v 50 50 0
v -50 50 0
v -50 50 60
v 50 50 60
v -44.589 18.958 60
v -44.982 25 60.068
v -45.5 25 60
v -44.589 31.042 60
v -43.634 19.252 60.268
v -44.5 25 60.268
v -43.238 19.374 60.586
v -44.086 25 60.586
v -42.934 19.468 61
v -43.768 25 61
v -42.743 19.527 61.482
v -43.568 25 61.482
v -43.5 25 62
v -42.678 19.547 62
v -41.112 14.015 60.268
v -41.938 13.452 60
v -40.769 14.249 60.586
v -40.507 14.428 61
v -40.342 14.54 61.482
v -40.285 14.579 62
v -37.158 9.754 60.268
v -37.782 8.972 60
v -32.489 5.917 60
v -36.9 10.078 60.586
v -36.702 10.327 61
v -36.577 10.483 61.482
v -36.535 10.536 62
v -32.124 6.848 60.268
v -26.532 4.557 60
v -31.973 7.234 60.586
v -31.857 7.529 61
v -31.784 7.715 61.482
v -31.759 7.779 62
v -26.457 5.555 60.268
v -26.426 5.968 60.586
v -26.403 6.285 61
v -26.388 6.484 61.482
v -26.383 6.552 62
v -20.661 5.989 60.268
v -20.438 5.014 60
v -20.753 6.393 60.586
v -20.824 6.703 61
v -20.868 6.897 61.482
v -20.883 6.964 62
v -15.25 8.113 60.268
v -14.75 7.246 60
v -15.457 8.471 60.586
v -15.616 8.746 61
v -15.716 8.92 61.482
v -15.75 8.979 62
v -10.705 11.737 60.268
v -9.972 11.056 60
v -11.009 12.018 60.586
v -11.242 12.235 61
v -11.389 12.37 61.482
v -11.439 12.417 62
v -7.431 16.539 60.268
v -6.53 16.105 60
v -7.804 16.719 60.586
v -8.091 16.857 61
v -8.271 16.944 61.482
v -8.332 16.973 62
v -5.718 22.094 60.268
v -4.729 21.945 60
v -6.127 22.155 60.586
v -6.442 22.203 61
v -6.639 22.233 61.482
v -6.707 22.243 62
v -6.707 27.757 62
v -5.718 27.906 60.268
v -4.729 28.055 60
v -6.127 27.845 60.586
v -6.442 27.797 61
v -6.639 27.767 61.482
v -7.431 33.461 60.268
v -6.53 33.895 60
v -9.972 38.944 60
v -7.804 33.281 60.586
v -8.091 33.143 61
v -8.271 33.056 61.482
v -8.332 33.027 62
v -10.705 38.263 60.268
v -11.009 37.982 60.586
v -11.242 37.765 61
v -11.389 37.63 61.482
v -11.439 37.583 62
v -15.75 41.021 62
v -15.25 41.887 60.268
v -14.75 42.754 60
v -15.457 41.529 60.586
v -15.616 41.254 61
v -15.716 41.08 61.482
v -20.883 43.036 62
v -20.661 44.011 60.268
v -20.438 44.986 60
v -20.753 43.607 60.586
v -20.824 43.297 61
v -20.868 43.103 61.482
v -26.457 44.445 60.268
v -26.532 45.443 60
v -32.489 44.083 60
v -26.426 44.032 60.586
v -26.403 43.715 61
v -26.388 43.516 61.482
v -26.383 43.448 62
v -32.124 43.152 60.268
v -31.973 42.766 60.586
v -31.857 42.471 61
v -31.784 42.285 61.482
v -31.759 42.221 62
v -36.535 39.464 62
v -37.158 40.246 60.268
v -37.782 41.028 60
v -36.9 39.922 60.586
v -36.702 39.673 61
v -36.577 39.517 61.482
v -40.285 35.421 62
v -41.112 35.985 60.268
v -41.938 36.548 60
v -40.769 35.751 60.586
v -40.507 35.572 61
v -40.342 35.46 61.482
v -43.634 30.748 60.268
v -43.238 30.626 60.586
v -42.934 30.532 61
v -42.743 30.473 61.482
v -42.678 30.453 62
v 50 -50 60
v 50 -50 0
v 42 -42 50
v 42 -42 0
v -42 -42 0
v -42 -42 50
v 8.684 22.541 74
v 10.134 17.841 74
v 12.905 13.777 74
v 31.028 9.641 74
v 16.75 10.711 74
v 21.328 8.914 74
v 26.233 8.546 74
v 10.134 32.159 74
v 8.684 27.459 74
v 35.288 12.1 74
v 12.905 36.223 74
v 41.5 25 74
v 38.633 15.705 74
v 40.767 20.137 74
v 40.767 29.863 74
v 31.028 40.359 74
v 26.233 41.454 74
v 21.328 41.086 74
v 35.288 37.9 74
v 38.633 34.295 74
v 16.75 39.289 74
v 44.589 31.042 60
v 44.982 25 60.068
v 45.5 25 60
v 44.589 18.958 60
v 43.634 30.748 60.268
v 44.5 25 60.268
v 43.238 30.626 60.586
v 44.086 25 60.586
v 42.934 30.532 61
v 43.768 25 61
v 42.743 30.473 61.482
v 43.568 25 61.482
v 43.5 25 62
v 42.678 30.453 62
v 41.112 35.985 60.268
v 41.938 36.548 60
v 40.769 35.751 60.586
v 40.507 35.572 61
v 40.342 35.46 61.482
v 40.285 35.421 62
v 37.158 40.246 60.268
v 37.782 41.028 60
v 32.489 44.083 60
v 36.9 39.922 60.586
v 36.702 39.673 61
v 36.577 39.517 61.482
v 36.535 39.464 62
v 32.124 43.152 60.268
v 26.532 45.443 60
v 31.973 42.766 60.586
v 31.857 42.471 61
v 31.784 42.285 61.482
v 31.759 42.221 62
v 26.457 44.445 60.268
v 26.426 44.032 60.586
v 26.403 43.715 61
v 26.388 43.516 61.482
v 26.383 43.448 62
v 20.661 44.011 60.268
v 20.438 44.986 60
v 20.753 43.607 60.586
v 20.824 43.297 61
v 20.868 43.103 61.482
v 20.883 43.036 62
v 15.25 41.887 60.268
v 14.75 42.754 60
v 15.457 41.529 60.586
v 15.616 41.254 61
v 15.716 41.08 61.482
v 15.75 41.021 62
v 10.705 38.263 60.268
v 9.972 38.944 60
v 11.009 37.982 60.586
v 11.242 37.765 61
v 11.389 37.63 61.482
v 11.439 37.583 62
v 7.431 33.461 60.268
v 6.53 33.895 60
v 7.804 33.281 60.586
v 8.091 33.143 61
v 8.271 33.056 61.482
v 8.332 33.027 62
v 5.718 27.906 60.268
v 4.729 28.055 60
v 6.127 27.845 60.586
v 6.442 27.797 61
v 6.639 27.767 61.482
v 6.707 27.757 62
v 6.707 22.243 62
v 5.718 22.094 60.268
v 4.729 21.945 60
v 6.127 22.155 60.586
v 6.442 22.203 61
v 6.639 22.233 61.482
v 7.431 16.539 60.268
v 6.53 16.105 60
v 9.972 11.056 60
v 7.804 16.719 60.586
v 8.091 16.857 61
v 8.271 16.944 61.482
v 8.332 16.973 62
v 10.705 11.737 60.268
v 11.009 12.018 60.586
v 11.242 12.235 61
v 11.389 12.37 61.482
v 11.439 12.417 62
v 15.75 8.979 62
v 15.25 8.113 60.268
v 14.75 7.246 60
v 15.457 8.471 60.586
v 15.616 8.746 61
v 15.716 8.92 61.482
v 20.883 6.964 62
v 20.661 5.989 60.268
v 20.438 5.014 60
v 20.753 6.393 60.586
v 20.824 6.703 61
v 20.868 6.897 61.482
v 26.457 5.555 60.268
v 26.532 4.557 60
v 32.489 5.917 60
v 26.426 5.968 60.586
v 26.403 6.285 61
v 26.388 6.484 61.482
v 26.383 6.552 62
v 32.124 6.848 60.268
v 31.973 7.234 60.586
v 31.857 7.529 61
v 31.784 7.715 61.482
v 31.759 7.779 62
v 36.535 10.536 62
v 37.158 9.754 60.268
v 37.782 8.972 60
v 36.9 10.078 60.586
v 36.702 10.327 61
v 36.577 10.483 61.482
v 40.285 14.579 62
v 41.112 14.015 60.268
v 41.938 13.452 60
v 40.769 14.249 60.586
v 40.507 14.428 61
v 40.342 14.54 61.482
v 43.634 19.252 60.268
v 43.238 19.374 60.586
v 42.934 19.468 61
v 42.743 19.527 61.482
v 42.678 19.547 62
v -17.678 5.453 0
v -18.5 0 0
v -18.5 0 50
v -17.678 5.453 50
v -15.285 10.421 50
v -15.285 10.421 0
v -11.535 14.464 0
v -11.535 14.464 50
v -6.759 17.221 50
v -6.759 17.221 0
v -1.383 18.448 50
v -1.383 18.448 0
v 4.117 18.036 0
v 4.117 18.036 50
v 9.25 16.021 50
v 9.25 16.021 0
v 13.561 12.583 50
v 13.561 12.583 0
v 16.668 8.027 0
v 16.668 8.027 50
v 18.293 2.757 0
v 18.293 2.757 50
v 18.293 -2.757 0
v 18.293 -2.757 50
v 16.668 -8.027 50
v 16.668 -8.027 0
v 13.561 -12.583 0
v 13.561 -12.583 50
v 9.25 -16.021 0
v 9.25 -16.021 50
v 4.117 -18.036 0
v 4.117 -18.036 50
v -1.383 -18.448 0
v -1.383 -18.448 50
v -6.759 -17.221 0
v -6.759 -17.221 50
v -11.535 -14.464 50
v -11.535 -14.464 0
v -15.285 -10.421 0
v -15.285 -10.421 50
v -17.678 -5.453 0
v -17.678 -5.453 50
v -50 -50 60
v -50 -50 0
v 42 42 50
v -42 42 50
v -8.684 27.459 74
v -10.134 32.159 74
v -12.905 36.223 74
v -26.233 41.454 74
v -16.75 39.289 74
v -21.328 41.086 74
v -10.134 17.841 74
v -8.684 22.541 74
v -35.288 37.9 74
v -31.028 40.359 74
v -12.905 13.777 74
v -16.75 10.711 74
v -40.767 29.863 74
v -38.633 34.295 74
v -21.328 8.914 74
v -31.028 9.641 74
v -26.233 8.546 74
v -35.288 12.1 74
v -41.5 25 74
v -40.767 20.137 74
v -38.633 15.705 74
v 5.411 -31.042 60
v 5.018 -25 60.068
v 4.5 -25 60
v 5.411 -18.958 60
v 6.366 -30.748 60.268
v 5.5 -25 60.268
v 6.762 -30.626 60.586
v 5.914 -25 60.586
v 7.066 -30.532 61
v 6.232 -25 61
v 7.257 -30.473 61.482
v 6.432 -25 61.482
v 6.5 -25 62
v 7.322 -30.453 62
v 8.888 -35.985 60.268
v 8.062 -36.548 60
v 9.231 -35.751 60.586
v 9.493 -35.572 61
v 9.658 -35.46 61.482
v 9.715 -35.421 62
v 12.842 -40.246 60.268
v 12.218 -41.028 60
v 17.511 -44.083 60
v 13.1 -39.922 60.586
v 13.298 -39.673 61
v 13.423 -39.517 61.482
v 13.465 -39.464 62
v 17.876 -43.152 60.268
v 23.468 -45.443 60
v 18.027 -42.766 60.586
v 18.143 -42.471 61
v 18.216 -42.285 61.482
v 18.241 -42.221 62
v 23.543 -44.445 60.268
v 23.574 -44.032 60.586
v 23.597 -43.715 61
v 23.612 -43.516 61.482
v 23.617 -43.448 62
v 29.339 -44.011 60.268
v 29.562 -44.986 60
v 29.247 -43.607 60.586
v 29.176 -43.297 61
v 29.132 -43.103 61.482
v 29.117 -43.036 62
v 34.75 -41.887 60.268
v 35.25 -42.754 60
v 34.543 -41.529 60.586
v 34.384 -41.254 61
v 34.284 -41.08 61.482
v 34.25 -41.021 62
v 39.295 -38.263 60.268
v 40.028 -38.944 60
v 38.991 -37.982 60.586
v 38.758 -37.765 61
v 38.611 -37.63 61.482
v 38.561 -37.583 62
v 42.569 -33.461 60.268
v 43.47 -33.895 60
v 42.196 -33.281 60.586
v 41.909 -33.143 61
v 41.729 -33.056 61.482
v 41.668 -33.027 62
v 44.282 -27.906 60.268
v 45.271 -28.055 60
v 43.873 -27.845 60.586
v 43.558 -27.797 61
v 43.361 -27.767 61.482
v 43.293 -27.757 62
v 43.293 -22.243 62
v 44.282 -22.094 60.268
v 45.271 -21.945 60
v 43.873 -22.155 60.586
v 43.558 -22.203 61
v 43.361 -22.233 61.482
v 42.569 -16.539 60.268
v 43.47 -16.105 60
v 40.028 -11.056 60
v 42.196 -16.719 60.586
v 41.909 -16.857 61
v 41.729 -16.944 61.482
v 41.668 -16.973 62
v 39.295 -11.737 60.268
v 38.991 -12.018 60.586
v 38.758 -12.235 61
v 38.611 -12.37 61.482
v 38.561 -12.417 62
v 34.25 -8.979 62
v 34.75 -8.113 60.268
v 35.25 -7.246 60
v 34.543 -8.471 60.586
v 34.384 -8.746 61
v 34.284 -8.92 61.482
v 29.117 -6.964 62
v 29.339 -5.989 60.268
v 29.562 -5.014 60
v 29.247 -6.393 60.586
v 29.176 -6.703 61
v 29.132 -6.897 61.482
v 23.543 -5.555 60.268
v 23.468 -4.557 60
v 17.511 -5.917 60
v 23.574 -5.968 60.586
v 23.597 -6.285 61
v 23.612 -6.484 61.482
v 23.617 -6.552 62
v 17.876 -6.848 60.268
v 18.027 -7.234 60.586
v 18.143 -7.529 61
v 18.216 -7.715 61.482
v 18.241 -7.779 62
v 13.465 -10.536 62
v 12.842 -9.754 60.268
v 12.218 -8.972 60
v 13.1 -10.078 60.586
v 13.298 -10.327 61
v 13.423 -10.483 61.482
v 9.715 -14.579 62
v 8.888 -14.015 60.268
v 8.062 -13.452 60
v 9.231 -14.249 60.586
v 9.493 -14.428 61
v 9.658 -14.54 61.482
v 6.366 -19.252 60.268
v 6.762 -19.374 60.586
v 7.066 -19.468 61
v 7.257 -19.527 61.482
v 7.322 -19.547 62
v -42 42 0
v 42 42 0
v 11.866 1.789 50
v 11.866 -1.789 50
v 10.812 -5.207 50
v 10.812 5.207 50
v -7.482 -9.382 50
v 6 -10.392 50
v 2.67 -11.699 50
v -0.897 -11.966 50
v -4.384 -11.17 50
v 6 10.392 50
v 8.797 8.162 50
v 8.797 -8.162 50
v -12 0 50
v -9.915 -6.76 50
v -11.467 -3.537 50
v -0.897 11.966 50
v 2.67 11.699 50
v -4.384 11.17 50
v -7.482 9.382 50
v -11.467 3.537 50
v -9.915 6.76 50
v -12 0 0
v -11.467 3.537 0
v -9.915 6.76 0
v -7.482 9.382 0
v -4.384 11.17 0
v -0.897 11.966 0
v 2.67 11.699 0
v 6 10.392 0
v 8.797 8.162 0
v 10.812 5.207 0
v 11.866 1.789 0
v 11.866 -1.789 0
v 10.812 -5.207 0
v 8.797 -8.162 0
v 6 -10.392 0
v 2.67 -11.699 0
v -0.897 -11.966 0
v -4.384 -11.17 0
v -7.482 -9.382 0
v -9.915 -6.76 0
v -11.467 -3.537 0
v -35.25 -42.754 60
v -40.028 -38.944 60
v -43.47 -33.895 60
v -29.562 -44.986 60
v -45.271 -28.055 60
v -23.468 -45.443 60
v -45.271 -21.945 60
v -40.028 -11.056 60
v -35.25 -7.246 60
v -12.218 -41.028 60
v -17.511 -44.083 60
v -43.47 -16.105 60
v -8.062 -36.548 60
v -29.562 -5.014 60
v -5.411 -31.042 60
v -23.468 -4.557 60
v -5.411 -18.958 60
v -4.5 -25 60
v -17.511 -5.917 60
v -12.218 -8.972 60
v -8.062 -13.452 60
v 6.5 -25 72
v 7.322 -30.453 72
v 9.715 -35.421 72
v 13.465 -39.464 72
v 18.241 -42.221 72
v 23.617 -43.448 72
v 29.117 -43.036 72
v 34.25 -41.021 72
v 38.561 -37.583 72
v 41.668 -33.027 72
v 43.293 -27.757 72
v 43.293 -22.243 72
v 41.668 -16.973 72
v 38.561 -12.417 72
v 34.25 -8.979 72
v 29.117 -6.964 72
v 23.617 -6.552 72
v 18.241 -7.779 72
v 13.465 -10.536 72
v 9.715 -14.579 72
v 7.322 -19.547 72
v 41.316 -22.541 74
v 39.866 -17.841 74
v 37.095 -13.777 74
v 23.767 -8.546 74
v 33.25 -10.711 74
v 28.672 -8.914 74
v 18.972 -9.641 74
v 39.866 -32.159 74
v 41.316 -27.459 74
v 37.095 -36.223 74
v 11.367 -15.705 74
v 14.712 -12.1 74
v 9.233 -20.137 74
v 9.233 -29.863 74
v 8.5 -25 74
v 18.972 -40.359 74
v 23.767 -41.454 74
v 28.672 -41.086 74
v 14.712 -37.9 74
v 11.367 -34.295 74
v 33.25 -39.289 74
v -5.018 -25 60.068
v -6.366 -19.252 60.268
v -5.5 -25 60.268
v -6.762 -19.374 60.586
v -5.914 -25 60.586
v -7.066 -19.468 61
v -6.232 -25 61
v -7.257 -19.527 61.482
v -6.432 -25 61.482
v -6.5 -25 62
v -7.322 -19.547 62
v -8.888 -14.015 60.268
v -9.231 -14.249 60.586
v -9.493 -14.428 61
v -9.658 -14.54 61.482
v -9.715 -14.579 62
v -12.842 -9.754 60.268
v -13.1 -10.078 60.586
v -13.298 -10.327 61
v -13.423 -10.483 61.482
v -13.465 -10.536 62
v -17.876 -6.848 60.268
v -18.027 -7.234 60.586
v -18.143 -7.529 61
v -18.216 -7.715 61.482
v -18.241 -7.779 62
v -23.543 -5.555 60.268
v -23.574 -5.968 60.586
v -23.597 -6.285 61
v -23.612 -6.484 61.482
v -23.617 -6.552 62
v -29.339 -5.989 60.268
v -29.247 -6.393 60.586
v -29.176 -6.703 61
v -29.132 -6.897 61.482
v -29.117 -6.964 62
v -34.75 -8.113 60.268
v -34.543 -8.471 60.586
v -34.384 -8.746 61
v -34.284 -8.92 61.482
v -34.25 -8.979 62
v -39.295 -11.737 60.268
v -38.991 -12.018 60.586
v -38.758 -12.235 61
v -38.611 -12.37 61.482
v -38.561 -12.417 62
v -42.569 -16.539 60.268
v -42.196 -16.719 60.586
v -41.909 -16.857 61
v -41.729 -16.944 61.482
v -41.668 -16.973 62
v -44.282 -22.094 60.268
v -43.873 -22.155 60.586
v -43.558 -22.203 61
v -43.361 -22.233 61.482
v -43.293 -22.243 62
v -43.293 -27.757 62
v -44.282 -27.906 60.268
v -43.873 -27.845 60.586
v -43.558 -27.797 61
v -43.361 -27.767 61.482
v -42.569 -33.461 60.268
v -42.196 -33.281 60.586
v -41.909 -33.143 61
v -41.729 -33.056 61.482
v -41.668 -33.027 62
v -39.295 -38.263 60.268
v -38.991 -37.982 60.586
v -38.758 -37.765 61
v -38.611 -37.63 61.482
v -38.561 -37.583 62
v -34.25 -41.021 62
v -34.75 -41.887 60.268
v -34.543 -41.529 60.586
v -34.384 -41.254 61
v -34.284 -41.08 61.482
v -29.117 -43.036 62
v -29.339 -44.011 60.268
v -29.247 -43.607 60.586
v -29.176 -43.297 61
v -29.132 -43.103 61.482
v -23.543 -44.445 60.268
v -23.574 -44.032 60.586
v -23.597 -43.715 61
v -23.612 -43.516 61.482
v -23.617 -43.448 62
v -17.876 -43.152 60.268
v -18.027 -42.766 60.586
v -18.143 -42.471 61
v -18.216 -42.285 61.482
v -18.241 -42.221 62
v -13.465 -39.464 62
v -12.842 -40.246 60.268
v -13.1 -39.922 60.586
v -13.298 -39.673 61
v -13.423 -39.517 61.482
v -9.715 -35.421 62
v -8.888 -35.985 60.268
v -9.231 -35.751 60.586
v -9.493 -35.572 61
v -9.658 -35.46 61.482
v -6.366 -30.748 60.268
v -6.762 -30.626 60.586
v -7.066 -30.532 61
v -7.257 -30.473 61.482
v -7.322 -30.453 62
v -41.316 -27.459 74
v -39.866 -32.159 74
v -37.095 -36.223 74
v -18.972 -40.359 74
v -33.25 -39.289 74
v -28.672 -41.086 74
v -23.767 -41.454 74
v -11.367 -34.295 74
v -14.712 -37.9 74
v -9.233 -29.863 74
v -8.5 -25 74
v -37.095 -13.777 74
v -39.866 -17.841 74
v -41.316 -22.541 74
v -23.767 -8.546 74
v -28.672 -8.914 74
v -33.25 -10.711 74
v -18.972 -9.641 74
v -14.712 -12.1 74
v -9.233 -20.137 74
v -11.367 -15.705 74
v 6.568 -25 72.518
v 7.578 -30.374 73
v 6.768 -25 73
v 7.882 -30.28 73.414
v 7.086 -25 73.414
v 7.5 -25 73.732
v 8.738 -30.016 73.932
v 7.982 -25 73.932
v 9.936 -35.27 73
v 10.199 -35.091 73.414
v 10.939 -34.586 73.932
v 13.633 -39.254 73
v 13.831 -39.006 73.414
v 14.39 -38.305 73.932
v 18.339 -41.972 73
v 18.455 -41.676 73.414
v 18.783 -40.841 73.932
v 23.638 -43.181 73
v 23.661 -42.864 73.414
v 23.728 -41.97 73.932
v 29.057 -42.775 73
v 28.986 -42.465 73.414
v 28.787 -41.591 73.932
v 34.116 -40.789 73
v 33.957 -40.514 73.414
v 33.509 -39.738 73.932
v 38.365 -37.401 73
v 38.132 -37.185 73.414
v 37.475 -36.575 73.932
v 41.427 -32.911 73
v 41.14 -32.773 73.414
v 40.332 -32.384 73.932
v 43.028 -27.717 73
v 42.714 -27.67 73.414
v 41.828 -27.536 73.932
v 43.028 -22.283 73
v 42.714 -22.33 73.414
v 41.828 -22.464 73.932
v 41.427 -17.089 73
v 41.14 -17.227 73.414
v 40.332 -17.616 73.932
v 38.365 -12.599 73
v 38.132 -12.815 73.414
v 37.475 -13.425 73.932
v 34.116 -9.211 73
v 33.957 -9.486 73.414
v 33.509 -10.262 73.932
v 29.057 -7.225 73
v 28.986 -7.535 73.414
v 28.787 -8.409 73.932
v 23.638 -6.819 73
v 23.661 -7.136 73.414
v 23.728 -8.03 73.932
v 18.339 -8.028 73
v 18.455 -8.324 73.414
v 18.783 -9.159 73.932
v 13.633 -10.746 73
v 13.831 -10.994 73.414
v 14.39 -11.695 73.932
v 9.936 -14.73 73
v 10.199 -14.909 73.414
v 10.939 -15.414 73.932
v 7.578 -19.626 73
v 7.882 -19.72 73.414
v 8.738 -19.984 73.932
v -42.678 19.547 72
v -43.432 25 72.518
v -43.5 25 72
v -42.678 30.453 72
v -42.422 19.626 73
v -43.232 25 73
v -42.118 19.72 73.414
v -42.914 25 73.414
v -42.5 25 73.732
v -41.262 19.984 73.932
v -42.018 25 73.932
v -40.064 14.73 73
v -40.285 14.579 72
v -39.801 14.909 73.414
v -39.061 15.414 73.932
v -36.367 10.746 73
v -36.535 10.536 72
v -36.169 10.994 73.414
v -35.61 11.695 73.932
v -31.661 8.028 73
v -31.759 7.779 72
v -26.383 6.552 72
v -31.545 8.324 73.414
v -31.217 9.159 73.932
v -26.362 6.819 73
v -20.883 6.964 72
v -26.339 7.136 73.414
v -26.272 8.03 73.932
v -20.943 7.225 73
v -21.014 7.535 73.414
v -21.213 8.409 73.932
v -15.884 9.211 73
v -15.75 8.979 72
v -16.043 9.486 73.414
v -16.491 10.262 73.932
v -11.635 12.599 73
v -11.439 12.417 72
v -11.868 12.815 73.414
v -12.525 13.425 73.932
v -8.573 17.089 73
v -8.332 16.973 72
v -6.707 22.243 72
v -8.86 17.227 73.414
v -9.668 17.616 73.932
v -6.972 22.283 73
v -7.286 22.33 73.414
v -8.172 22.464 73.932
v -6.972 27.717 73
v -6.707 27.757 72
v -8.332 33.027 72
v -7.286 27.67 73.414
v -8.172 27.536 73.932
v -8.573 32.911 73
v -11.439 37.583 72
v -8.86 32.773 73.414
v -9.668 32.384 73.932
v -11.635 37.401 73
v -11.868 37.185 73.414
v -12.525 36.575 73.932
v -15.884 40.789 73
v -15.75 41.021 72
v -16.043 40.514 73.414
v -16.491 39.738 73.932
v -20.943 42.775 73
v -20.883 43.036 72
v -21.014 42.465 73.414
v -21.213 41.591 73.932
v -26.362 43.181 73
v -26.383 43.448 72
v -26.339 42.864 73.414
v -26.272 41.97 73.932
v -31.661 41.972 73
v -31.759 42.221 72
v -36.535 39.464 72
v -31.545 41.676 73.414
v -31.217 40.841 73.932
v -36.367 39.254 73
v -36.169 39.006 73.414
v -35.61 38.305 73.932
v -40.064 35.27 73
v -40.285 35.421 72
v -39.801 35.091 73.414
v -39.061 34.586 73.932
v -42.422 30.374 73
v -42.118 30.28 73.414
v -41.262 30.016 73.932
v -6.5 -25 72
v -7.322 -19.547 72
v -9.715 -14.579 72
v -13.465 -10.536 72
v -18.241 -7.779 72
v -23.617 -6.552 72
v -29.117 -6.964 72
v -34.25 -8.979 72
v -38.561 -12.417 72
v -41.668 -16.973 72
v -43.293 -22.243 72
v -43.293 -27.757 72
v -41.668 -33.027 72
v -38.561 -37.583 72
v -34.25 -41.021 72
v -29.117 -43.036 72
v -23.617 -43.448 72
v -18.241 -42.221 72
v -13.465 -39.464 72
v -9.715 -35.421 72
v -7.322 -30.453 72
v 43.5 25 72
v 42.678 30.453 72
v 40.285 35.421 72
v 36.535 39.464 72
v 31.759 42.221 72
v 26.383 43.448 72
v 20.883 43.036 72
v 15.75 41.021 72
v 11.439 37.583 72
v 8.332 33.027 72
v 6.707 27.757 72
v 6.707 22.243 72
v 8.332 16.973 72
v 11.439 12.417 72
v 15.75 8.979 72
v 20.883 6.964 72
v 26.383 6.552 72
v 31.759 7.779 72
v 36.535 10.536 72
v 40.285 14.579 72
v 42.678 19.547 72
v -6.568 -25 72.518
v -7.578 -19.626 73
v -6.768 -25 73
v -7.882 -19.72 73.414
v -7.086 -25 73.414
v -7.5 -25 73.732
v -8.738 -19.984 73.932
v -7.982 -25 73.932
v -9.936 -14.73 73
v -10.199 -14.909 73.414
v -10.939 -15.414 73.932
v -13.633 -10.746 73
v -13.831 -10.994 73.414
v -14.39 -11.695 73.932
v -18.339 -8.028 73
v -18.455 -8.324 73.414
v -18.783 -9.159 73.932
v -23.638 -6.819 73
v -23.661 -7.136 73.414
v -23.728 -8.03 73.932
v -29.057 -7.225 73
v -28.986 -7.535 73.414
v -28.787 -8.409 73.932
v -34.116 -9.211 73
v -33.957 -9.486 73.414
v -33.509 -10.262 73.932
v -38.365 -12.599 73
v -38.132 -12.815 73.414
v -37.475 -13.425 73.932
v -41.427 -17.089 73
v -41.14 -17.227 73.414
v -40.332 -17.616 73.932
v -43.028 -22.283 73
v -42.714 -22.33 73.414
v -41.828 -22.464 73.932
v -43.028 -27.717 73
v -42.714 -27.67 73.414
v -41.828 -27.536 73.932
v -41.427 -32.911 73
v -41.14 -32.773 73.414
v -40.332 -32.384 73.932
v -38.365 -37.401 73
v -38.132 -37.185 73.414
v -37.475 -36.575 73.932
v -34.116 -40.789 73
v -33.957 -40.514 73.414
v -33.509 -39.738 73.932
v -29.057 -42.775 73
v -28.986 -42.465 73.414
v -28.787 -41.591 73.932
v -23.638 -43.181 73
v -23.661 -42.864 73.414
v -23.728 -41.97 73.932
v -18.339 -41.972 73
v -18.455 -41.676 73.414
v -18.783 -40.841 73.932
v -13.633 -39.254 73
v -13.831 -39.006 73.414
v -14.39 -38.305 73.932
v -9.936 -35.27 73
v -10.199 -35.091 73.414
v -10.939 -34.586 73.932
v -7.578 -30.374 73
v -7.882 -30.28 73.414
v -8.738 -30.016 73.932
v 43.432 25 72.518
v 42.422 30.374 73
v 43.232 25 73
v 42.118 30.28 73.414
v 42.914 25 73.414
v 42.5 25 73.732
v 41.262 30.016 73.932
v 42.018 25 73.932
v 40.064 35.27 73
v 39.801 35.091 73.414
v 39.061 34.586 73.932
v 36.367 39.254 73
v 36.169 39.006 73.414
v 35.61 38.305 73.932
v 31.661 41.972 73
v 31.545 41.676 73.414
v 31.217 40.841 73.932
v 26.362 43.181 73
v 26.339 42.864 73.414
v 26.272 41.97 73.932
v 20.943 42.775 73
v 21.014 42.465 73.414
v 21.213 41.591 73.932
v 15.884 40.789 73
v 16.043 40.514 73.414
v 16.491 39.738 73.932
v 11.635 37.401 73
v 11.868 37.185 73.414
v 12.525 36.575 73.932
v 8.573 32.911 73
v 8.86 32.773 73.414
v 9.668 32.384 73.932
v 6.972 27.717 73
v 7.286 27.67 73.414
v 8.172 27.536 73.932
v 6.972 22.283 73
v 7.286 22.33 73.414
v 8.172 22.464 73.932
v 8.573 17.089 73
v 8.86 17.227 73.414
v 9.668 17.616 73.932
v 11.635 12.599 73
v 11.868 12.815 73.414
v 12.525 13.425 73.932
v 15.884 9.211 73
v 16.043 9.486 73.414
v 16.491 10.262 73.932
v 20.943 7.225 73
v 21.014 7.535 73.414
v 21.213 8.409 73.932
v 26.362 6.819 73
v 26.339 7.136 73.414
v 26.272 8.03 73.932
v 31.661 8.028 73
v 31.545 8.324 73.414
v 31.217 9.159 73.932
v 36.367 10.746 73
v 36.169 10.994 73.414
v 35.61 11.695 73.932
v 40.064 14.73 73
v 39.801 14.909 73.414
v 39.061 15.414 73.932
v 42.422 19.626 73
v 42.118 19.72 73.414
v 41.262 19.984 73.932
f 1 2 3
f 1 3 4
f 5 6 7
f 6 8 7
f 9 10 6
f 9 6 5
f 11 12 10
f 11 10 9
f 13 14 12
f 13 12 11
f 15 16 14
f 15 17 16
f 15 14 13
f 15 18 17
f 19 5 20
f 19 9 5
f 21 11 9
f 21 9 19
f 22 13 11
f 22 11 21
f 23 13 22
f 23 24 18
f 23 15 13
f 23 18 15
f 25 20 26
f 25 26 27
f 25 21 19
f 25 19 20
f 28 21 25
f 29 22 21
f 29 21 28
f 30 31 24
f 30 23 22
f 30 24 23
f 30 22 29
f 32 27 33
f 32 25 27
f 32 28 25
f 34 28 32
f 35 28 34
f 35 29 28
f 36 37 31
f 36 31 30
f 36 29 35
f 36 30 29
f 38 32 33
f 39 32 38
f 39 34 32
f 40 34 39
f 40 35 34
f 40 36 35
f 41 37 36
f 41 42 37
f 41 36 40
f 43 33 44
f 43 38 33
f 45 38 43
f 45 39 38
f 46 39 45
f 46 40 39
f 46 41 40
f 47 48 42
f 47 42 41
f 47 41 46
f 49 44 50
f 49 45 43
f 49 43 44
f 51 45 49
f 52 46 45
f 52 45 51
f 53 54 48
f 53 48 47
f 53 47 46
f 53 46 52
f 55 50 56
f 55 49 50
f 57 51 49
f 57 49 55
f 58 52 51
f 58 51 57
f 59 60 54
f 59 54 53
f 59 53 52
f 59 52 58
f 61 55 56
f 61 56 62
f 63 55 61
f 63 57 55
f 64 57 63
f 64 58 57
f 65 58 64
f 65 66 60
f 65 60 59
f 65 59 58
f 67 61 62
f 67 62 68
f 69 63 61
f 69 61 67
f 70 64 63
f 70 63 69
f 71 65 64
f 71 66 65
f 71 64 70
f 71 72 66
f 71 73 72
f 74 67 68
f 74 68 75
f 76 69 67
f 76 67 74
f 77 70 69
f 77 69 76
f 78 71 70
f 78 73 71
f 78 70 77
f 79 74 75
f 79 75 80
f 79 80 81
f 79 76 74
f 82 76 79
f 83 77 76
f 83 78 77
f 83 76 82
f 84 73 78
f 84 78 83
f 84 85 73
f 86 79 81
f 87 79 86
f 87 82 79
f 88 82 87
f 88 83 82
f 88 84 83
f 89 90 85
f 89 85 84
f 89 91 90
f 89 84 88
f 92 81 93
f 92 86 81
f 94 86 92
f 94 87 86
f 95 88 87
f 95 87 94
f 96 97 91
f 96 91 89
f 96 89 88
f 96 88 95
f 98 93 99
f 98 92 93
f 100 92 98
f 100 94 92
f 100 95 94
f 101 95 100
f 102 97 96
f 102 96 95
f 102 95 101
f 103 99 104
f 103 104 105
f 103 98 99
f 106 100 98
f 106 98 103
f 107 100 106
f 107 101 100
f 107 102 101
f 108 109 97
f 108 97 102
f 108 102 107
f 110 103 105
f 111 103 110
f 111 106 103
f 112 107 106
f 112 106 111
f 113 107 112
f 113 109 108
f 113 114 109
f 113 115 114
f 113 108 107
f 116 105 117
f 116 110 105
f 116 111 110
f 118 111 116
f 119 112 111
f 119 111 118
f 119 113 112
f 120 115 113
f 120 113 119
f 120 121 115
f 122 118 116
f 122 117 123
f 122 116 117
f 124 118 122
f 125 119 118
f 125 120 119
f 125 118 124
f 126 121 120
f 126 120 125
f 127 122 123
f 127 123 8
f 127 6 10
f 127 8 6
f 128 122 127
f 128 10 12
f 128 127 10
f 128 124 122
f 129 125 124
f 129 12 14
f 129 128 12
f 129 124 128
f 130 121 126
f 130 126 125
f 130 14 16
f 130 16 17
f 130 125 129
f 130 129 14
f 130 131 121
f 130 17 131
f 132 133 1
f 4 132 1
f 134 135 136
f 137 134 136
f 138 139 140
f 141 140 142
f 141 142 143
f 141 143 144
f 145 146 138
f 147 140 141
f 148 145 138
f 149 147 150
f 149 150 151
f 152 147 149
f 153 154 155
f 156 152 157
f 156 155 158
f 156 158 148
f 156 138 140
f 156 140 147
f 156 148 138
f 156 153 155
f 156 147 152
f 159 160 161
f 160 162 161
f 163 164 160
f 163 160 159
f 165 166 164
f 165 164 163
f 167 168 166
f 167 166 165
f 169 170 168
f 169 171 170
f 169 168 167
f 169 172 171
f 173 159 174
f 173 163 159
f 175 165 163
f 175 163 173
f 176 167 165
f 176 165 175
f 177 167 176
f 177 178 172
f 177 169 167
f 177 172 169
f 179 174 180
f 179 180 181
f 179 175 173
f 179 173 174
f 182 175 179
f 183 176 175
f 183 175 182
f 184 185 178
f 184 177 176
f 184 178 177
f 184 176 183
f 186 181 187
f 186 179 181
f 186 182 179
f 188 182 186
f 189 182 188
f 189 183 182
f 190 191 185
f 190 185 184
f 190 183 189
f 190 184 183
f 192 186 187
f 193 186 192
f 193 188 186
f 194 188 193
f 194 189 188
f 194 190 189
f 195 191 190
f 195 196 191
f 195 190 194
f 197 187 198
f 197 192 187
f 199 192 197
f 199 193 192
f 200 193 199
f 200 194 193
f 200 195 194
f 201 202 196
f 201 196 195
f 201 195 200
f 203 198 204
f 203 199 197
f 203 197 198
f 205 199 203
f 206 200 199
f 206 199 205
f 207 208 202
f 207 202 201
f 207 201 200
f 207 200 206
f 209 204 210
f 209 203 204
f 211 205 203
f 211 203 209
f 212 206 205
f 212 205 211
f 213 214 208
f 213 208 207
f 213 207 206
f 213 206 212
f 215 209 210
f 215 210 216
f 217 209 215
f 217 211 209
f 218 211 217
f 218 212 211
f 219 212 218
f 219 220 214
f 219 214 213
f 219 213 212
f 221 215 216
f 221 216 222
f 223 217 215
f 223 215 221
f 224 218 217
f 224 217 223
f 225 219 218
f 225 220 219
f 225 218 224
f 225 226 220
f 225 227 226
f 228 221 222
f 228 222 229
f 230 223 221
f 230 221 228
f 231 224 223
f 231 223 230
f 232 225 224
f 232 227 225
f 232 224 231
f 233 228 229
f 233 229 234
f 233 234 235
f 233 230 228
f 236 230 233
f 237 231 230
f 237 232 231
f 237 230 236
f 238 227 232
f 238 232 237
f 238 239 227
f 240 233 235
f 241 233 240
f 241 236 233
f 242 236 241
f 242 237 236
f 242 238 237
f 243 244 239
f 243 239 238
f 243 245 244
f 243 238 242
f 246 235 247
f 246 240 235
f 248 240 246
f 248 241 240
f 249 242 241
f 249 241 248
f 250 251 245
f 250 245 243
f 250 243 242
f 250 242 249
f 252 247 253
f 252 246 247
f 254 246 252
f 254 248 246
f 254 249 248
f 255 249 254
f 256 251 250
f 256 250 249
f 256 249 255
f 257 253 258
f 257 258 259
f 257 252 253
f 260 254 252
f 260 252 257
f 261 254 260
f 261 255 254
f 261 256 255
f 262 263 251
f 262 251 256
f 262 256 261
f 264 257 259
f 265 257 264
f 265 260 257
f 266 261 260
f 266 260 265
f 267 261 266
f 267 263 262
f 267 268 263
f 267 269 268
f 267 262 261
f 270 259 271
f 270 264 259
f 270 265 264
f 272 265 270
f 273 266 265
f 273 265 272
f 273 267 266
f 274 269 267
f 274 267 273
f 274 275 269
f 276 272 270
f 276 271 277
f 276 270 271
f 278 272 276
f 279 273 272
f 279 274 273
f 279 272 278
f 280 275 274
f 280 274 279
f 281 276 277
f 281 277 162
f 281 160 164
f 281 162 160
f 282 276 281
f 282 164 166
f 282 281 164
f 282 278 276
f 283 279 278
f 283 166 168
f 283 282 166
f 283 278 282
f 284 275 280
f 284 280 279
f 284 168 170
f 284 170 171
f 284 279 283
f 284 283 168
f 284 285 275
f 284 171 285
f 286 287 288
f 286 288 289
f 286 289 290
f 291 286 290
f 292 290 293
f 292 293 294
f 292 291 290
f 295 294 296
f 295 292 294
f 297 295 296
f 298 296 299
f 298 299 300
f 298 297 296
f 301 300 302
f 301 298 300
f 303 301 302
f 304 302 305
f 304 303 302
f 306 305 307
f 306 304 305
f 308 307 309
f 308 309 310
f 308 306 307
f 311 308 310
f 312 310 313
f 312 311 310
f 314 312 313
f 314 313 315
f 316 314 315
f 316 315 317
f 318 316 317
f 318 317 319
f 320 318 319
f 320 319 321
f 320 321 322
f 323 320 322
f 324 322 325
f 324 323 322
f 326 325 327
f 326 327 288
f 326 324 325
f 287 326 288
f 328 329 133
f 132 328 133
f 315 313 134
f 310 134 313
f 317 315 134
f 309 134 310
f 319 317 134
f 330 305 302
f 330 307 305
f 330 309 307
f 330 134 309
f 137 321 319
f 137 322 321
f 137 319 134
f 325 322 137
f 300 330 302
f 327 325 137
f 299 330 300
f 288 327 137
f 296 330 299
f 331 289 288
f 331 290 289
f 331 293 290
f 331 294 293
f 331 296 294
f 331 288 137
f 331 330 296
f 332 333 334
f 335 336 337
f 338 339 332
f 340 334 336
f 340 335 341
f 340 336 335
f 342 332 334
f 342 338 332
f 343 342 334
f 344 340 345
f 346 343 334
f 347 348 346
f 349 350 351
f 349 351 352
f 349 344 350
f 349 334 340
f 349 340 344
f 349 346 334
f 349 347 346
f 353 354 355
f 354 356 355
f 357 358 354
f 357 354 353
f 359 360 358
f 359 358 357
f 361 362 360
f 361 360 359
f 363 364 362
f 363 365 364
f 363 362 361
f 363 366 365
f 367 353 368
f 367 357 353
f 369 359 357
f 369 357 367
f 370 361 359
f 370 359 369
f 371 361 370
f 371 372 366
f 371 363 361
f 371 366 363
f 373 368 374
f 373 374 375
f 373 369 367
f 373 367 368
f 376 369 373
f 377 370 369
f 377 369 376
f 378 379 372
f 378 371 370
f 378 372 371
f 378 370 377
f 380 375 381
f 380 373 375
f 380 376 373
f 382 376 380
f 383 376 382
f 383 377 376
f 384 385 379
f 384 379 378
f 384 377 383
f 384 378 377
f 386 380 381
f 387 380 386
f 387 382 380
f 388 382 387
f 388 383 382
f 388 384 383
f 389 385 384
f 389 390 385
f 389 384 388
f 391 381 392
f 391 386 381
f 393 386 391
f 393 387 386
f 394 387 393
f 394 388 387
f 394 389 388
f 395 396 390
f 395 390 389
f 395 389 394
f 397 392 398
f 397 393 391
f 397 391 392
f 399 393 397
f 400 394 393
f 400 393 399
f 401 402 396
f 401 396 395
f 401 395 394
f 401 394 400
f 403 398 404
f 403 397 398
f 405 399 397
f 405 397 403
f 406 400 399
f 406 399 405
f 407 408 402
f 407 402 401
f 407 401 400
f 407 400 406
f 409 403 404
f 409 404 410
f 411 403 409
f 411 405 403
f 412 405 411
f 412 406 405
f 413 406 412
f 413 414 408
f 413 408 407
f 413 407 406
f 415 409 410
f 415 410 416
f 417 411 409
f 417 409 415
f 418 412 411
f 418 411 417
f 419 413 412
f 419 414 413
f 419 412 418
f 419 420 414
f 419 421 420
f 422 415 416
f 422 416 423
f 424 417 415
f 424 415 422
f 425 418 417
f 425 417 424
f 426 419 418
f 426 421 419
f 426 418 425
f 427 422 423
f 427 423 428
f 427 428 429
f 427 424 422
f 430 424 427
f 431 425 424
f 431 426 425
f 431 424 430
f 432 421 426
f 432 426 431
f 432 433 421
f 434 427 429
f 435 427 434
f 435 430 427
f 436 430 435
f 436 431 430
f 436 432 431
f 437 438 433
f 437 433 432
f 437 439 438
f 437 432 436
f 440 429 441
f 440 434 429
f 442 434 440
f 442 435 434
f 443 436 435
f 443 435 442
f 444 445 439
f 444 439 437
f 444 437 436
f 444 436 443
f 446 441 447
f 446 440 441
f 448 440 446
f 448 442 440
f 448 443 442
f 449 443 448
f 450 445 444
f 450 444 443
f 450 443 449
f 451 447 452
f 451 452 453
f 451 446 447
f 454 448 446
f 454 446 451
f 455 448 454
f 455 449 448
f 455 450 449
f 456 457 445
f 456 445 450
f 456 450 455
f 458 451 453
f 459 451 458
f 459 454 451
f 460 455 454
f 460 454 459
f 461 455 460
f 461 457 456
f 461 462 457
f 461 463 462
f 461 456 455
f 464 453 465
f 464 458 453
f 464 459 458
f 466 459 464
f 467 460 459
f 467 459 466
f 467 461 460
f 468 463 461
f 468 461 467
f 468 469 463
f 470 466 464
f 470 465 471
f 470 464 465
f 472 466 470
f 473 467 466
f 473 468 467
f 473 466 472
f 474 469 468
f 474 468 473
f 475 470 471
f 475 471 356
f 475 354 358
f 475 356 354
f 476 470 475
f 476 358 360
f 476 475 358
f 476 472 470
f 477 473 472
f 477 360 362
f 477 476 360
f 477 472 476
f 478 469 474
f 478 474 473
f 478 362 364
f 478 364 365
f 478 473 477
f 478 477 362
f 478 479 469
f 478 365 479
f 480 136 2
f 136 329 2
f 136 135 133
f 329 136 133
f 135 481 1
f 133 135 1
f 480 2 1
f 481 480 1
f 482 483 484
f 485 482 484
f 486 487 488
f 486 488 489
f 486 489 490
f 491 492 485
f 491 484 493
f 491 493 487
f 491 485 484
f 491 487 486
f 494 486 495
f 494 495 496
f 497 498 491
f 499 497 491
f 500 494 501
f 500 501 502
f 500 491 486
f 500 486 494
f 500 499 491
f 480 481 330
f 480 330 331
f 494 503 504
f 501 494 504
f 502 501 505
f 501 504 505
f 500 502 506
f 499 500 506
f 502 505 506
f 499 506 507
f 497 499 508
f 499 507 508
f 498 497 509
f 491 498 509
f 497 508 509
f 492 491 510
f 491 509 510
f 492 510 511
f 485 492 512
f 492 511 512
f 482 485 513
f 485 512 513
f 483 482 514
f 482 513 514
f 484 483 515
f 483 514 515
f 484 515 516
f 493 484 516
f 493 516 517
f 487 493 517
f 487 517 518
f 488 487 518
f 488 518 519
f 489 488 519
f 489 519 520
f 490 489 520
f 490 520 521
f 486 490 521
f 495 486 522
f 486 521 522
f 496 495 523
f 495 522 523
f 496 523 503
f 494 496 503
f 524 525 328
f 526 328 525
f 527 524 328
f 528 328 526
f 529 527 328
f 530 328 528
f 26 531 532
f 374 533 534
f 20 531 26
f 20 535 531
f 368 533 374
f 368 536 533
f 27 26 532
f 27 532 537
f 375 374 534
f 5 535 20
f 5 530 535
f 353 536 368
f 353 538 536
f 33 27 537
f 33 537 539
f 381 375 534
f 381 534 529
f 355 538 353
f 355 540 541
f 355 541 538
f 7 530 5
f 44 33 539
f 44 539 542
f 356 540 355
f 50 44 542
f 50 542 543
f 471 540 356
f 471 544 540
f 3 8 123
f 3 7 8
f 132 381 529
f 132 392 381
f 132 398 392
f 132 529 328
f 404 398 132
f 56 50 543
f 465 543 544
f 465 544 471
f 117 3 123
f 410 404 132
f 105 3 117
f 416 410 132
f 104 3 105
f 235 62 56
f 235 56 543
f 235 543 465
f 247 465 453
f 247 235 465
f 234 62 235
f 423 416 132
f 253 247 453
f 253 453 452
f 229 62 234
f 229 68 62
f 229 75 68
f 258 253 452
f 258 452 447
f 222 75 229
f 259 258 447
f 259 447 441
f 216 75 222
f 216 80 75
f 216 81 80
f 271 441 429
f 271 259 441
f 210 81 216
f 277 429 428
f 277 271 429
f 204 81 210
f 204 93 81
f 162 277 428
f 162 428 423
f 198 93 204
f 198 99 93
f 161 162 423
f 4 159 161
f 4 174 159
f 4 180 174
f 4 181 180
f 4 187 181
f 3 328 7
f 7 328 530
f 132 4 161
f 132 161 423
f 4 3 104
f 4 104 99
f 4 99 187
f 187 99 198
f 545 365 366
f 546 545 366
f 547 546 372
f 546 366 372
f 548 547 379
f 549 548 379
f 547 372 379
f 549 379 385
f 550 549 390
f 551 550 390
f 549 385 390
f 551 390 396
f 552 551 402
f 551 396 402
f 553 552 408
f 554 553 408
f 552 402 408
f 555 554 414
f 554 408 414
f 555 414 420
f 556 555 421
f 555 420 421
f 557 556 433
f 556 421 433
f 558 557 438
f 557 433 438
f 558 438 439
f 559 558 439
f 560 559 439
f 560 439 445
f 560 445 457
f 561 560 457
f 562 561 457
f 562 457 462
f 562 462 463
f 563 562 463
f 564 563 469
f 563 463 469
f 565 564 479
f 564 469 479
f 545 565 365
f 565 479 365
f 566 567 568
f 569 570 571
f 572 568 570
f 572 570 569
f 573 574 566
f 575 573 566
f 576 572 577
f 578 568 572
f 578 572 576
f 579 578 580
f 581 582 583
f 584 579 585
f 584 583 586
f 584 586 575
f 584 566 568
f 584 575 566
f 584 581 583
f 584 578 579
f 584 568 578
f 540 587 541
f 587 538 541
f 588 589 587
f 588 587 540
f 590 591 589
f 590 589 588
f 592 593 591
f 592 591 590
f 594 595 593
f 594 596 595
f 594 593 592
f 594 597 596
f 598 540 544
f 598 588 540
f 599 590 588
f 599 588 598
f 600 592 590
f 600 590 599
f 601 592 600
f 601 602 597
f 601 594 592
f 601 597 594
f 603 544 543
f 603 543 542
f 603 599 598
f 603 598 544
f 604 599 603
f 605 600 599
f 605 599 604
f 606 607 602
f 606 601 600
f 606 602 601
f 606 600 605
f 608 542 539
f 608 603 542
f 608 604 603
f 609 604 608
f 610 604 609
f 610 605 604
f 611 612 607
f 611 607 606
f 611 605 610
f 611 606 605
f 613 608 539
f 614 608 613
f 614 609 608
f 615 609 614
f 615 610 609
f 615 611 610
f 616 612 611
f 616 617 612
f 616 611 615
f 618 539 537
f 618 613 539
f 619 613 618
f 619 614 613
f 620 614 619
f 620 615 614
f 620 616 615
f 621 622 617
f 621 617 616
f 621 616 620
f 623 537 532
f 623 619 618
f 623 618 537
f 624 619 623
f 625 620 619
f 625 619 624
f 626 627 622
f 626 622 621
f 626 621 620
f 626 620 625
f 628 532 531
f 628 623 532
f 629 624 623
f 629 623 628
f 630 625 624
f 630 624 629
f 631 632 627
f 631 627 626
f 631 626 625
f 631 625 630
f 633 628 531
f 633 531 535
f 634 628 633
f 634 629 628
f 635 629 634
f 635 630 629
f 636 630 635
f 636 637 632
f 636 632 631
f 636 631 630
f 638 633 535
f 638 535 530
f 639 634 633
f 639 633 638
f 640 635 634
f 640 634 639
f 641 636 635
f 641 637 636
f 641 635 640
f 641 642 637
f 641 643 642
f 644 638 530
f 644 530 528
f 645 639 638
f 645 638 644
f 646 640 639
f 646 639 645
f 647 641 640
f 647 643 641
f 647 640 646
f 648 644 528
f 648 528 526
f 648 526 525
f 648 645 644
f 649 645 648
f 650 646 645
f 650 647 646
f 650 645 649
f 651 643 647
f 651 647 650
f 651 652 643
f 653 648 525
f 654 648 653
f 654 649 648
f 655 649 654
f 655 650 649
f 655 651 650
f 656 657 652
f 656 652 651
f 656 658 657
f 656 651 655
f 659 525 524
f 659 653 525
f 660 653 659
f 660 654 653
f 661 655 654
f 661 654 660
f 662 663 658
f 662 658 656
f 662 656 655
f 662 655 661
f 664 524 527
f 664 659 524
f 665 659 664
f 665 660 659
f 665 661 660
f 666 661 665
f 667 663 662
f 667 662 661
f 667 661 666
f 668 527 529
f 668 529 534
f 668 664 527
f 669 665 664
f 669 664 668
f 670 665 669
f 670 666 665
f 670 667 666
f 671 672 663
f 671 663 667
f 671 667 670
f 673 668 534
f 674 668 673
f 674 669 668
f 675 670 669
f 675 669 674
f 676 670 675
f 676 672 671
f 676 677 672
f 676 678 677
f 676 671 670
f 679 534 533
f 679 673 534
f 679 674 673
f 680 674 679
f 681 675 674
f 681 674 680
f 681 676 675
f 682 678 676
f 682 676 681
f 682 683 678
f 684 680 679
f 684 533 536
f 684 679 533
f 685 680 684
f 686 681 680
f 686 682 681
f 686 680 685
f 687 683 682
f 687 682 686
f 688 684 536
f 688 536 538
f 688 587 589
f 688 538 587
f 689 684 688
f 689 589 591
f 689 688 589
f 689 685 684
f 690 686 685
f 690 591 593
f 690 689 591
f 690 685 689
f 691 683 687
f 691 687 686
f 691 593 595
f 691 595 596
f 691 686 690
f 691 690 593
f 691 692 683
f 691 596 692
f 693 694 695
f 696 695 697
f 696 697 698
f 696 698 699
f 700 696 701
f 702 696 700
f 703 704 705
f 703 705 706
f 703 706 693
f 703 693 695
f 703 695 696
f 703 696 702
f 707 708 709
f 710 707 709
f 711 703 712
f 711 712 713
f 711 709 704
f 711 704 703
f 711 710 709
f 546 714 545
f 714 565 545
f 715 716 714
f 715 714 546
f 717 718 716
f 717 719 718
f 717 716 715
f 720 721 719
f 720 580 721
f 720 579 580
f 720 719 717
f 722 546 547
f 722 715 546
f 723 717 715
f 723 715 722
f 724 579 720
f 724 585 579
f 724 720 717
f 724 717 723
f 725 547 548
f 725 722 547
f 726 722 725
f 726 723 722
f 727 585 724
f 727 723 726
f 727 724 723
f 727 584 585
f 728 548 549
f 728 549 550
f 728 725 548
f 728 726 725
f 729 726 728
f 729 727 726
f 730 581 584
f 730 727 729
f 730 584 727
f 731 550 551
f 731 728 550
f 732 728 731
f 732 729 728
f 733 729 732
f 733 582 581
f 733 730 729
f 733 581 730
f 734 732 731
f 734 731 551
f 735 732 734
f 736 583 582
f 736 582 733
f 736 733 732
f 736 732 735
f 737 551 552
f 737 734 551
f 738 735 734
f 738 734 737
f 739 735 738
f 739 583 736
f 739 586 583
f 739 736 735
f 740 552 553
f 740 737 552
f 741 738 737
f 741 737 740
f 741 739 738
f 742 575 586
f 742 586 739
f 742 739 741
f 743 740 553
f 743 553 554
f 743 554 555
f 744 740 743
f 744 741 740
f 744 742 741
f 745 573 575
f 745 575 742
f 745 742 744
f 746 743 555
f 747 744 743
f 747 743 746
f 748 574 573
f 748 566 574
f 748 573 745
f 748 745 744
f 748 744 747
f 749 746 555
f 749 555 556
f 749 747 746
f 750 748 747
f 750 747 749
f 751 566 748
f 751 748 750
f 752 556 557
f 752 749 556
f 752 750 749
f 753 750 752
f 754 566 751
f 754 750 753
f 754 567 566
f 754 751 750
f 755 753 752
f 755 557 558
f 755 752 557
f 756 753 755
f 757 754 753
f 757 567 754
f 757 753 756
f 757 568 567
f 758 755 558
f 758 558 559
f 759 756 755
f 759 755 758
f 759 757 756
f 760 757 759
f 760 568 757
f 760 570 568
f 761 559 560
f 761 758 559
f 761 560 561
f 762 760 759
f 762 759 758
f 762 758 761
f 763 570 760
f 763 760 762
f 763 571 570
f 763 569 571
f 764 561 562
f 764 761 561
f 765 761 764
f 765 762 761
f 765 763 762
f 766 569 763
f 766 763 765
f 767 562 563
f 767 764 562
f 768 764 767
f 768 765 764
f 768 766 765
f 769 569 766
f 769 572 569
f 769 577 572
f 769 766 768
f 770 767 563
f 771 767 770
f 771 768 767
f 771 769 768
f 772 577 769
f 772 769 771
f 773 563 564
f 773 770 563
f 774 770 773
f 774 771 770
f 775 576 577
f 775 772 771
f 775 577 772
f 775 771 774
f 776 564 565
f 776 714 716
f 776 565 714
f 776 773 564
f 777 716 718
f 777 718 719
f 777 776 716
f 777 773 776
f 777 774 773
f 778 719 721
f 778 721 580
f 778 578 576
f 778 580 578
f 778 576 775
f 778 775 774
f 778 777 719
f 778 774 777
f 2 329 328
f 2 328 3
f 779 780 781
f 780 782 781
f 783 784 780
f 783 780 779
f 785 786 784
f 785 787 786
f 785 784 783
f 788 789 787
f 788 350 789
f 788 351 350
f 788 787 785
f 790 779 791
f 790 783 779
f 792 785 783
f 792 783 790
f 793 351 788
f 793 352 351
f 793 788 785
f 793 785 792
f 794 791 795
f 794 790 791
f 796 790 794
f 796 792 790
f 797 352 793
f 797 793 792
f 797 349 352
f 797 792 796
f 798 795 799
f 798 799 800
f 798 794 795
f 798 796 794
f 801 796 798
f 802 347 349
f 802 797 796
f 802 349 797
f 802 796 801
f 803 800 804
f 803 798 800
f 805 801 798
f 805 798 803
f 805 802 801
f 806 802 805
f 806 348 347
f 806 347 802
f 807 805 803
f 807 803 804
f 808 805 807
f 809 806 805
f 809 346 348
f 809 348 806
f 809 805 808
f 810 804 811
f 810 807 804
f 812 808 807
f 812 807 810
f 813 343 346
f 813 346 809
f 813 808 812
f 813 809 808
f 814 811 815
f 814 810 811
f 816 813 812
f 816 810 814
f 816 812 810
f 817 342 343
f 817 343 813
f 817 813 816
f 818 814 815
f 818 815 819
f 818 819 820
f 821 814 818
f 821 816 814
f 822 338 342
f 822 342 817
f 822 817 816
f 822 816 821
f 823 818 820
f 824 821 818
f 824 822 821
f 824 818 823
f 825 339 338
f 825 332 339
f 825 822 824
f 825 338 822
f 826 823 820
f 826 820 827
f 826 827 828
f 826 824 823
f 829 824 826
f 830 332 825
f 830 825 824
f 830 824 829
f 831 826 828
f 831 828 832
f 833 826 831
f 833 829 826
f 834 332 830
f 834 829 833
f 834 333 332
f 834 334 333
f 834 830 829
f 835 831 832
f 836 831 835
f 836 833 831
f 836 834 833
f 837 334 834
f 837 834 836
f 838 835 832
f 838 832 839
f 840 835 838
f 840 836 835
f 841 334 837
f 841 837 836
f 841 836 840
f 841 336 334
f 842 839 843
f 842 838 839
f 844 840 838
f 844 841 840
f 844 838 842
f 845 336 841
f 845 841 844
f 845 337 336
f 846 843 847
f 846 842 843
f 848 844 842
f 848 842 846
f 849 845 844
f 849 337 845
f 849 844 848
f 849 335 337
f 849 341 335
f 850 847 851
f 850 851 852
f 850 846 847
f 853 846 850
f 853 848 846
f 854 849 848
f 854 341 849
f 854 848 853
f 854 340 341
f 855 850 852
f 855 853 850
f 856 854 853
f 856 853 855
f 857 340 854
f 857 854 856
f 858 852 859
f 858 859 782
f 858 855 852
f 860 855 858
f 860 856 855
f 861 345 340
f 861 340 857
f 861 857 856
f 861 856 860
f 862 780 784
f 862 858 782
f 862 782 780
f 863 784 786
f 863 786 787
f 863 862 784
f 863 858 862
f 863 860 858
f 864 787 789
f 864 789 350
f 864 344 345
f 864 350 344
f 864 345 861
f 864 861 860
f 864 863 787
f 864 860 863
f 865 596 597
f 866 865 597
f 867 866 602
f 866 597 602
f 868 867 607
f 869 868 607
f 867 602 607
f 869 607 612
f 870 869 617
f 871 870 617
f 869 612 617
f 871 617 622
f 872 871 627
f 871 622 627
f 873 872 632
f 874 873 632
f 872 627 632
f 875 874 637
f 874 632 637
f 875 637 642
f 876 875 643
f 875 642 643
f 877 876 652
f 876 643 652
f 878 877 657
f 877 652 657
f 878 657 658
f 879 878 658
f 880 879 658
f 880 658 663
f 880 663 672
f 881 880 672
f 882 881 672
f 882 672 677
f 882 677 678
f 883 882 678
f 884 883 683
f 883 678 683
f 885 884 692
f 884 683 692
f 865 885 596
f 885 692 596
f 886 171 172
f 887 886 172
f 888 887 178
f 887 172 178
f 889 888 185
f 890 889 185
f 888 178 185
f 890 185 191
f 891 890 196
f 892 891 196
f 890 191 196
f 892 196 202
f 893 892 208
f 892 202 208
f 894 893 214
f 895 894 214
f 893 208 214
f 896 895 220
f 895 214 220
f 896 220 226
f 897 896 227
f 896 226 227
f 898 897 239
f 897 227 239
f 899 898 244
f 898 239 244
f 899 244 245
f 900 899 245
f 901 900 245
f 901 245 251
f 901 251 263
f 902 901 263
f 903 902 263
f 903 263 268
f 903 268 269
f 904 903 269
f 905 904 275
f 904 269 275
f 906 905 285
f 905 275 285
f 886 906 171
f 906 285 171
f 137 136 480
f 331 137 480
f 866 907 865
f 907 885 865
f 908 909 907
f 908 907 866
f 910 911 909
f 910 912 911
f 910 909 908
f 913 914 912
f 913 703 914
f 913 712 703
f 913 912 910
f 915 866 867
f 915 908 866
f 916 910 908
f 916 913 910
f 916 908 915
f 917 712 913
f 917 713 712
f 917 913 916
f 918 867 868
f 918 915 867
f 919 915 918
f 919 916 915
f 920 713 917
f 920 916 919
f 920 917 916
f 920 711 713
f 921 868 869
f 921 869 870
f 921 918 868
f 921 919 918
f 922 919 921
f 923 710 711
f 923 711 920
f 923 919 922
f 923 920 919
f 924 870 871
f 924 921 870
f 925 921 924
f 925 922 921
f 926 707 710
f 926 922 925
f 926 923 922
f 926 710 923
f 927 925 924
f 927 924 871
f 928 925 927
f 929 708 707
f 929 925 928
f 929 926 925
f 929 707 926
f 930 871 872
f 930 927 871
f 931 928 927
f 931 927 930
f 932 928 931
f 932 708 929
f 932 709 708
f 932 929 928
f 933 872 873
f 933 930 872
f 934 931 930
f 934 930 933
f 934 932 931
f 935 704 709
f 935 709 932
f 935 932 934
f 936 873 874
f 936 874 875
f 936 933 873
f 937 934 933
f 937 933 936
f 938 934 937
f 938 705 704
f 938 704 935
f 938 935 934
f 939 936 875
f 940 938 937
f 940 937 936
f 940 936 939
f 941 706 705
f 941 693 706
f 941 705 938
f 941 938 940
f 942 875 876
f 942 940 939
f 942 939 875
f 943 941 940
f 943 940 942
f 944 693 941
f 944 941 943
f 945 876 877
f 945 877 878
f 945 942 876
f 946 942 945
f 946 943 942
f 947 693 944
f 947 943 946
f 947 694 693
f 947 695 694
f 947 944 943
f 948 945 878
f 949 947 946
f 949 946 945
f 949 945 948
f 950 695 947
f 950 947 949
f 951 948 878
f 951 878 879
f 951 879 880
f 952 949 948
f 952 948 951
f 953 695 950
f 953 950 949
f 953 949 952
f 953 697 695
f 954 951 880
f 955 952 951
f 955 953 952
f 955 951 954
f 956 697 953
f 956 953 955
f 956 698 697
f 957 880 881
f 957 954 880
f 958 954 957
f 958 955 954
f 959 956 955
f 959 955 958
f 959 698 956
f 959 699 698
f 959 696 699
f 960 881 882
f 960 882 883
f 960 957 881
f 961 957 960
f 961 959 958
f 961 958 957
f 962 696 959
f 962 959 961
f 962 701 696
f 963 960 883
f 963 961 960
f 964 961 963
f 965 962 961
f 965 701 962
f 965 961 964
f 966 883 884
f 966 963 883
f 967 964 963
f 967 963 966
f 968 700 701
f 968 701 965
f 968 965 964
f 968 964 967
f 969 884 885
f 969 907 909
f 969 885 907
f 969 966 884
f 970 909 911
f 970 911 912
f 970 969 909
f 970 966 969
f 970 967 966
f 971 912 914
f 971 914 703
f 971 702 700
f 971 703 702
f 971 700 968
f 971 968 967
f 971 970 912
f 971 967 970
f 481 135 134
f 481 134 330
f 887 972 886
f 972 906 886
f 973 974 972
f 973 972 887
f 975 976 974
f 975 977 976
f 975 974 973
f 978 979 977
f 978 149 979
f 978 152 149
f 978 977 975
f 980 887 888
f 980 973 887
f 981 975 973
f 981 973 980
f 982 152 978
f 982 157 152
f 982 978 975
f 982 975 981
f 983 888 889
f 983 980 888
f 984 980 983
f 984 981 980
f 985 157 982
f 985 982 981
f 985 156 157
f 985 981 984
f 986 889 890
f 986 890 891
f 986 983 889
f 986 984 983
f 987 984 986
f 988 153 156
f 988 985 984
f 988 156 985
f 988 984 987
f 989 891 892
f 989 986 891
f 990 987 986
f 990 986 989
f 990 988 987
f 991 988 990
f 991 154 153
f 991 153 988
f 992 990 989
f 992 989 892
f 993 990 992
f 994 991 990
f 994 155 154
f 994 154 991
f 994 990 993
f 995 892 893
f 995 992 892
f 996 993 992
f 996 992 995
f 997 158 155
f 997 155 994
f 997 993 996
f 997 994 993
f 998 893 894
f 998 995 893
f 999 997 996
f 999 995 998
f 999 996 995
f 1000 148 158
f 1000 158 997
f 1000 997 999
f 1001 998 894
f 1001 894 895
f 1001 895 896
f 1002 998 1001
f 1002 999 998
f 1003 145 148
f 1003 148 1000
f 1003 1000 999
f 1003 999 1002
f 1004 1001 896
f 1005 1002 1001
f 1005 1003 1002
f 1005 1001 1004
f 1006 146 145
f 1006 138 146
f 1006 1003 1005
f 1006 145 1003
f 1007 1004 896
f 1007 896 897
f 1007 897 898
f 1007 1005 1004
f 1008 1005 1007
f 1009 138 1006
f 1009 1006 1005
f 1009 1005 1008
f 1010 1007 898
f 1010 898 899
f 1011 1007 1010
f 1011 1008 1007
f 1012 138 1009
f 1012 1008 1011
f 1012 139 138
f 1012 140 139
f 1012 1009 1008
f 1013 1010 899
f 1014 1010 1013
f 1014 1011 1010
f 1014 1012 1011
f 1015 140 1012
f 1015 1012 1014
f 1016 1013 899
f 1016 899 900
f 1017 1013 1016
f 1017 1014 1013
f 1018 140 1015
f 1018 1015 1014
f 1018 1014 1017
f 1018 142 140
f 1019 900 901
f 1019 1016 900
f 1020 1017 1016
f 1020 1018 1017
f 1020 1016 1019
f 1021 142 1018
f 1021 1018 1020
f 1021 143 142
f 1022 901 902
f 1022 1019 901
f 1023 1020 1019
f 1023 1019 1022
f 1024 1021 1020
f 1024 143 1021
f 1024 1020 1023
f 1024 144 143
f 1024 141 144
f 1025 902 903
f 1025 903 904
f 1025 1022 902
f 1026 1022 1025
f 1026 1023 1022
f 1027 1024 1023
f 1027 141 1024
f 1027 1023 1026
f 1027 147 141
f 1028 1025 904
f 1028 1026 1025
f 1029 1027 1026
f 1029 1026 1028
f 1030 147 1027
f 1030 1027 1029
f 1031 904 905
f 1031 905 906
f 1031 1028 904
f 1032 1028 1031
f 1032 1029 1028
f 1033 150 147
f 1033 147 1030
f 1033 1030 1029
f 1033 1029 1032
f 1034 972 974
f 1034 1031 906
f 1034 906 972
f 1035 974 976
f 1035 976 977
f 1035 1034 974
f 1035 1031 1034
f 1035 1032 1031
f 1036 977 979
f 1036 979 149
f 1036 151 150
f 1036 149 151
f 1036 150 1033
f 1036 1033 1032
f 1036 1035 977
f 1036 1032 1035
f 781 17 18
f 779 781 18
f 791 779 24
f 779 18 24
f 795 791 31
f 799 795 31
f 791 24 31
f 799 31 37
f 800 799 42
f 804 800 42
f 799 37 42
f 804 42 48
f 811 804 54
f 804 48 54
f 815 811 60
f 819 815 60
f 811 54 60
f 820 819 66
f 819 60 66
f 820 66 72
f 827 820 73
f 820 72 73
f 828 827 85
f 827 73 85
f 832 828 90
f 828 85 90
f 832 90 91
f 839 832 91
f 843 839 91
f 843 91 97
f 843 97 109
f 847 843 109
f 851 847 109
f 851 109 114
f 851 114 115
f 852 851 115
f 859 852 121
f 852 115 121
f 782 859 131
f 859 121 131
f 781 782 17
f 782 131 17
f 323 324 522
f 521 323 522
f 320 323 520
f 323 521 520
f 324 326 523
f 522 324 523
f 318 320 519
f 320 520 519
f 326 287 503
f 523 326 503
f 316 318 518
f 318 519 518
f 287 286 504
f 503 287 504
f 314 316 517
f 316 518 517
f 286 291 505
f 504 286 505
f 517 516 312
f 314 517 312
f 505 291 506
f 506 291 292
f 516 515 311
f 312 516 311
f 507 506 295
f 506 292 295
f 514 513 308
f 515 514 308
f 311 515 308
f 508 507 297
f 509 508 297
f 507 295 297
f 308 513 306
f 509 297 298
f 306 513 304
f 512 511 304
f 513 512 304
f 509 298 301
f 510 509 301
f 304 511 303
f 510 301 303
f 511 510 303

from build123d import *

# Parameters (mm, degrees)
ESQUISSE2_W             = 100
ESQUISSE2_H             = 100
BOSS_EXTRU_1_DEPTH      = 60
ESQUISSE3_R             = 18.5
BOSS_EXTRU_2_DEPTH      = 14
ESQUISSE4_W             = 84
ESQUISSE4_H             = 84
ESQUISSE4_R             = 18.5
ESQUISSE4_R_2           = 12
ENL_V_MAT_EXTRU_4_DEPTH = 50
CONG_1_R                = 2


with BuildPart() as part:
    # Esquisse2 → Boss.-Extru.1 (new body)
    with BuildSketch(Plane.XY):
        Rectangle(ESQUISSE2_W, ESQUISSE2_H)
    extrude(amount=BOSS_EXTRU_1_DEPTH)

    # Esquisse3 → Boss.-Extru.2 (add)
    with BuildSketch(Plane.XY.offset(60)):
        with Locations((25, 25)):
            Circle(ESQUISSE3_R)
        with Locations(Location((25, -25, 0), (0, 0, 180))):
            Circle(ESQUISSE3_R)
        with Locations(Location((-25, 25, 0), (0, 0, 180))):
            Circle(ESQUISSE3_R)
        with Locations((-25, -25)):
            Circle(ESQUISSE3_R)
    extrude(amount=BOSS_EXTRU_2_DEPTH)

    # Esquisse4 → Enlèv. mat.-Extru.4 (cut)
    # profile 1 of 2: a face of its own
    with BuildSketch(Plane(origin=(0, 0, 0), x_dir=(-1, 0, 0), z_dir=(0, 0, -1))):
        Rectangle(ESQUISSE4_W, ESQUISSE4_H)
        Circle(ESQUISSE4_R, mode=Mode.SUBTRACT)
    # profile 2 of 2: a face of its own
    with BuildSketch(Plane(origin=(0, 0, 0), x_dir=(-1, 0, 0), z_dir=(0, 0, -1))):
        Circle(ESQUISSE4_R_2)
    extrude(amount=-ENL_V_MAT_EXTRU_4_DEPTH, mode=Mode.SUBTRACT)

    # Congé1
    cong_1_edges = [part.edges().sort_by_distance(p)[0] for p in [
        (6.5, 25, 60),
        (6.5, 25, 74),
        (43.5, -25, 60),
        (43.5, -25, 74),
        (-6.5, 25, 60),
        (-6.5, 25, 74),
        (-43.5, -25, 60),
        (-43.5, -25, 74),
    ]]
    fillet(cong_1_edges, radius=CONG_1_R)


solid = part.part
